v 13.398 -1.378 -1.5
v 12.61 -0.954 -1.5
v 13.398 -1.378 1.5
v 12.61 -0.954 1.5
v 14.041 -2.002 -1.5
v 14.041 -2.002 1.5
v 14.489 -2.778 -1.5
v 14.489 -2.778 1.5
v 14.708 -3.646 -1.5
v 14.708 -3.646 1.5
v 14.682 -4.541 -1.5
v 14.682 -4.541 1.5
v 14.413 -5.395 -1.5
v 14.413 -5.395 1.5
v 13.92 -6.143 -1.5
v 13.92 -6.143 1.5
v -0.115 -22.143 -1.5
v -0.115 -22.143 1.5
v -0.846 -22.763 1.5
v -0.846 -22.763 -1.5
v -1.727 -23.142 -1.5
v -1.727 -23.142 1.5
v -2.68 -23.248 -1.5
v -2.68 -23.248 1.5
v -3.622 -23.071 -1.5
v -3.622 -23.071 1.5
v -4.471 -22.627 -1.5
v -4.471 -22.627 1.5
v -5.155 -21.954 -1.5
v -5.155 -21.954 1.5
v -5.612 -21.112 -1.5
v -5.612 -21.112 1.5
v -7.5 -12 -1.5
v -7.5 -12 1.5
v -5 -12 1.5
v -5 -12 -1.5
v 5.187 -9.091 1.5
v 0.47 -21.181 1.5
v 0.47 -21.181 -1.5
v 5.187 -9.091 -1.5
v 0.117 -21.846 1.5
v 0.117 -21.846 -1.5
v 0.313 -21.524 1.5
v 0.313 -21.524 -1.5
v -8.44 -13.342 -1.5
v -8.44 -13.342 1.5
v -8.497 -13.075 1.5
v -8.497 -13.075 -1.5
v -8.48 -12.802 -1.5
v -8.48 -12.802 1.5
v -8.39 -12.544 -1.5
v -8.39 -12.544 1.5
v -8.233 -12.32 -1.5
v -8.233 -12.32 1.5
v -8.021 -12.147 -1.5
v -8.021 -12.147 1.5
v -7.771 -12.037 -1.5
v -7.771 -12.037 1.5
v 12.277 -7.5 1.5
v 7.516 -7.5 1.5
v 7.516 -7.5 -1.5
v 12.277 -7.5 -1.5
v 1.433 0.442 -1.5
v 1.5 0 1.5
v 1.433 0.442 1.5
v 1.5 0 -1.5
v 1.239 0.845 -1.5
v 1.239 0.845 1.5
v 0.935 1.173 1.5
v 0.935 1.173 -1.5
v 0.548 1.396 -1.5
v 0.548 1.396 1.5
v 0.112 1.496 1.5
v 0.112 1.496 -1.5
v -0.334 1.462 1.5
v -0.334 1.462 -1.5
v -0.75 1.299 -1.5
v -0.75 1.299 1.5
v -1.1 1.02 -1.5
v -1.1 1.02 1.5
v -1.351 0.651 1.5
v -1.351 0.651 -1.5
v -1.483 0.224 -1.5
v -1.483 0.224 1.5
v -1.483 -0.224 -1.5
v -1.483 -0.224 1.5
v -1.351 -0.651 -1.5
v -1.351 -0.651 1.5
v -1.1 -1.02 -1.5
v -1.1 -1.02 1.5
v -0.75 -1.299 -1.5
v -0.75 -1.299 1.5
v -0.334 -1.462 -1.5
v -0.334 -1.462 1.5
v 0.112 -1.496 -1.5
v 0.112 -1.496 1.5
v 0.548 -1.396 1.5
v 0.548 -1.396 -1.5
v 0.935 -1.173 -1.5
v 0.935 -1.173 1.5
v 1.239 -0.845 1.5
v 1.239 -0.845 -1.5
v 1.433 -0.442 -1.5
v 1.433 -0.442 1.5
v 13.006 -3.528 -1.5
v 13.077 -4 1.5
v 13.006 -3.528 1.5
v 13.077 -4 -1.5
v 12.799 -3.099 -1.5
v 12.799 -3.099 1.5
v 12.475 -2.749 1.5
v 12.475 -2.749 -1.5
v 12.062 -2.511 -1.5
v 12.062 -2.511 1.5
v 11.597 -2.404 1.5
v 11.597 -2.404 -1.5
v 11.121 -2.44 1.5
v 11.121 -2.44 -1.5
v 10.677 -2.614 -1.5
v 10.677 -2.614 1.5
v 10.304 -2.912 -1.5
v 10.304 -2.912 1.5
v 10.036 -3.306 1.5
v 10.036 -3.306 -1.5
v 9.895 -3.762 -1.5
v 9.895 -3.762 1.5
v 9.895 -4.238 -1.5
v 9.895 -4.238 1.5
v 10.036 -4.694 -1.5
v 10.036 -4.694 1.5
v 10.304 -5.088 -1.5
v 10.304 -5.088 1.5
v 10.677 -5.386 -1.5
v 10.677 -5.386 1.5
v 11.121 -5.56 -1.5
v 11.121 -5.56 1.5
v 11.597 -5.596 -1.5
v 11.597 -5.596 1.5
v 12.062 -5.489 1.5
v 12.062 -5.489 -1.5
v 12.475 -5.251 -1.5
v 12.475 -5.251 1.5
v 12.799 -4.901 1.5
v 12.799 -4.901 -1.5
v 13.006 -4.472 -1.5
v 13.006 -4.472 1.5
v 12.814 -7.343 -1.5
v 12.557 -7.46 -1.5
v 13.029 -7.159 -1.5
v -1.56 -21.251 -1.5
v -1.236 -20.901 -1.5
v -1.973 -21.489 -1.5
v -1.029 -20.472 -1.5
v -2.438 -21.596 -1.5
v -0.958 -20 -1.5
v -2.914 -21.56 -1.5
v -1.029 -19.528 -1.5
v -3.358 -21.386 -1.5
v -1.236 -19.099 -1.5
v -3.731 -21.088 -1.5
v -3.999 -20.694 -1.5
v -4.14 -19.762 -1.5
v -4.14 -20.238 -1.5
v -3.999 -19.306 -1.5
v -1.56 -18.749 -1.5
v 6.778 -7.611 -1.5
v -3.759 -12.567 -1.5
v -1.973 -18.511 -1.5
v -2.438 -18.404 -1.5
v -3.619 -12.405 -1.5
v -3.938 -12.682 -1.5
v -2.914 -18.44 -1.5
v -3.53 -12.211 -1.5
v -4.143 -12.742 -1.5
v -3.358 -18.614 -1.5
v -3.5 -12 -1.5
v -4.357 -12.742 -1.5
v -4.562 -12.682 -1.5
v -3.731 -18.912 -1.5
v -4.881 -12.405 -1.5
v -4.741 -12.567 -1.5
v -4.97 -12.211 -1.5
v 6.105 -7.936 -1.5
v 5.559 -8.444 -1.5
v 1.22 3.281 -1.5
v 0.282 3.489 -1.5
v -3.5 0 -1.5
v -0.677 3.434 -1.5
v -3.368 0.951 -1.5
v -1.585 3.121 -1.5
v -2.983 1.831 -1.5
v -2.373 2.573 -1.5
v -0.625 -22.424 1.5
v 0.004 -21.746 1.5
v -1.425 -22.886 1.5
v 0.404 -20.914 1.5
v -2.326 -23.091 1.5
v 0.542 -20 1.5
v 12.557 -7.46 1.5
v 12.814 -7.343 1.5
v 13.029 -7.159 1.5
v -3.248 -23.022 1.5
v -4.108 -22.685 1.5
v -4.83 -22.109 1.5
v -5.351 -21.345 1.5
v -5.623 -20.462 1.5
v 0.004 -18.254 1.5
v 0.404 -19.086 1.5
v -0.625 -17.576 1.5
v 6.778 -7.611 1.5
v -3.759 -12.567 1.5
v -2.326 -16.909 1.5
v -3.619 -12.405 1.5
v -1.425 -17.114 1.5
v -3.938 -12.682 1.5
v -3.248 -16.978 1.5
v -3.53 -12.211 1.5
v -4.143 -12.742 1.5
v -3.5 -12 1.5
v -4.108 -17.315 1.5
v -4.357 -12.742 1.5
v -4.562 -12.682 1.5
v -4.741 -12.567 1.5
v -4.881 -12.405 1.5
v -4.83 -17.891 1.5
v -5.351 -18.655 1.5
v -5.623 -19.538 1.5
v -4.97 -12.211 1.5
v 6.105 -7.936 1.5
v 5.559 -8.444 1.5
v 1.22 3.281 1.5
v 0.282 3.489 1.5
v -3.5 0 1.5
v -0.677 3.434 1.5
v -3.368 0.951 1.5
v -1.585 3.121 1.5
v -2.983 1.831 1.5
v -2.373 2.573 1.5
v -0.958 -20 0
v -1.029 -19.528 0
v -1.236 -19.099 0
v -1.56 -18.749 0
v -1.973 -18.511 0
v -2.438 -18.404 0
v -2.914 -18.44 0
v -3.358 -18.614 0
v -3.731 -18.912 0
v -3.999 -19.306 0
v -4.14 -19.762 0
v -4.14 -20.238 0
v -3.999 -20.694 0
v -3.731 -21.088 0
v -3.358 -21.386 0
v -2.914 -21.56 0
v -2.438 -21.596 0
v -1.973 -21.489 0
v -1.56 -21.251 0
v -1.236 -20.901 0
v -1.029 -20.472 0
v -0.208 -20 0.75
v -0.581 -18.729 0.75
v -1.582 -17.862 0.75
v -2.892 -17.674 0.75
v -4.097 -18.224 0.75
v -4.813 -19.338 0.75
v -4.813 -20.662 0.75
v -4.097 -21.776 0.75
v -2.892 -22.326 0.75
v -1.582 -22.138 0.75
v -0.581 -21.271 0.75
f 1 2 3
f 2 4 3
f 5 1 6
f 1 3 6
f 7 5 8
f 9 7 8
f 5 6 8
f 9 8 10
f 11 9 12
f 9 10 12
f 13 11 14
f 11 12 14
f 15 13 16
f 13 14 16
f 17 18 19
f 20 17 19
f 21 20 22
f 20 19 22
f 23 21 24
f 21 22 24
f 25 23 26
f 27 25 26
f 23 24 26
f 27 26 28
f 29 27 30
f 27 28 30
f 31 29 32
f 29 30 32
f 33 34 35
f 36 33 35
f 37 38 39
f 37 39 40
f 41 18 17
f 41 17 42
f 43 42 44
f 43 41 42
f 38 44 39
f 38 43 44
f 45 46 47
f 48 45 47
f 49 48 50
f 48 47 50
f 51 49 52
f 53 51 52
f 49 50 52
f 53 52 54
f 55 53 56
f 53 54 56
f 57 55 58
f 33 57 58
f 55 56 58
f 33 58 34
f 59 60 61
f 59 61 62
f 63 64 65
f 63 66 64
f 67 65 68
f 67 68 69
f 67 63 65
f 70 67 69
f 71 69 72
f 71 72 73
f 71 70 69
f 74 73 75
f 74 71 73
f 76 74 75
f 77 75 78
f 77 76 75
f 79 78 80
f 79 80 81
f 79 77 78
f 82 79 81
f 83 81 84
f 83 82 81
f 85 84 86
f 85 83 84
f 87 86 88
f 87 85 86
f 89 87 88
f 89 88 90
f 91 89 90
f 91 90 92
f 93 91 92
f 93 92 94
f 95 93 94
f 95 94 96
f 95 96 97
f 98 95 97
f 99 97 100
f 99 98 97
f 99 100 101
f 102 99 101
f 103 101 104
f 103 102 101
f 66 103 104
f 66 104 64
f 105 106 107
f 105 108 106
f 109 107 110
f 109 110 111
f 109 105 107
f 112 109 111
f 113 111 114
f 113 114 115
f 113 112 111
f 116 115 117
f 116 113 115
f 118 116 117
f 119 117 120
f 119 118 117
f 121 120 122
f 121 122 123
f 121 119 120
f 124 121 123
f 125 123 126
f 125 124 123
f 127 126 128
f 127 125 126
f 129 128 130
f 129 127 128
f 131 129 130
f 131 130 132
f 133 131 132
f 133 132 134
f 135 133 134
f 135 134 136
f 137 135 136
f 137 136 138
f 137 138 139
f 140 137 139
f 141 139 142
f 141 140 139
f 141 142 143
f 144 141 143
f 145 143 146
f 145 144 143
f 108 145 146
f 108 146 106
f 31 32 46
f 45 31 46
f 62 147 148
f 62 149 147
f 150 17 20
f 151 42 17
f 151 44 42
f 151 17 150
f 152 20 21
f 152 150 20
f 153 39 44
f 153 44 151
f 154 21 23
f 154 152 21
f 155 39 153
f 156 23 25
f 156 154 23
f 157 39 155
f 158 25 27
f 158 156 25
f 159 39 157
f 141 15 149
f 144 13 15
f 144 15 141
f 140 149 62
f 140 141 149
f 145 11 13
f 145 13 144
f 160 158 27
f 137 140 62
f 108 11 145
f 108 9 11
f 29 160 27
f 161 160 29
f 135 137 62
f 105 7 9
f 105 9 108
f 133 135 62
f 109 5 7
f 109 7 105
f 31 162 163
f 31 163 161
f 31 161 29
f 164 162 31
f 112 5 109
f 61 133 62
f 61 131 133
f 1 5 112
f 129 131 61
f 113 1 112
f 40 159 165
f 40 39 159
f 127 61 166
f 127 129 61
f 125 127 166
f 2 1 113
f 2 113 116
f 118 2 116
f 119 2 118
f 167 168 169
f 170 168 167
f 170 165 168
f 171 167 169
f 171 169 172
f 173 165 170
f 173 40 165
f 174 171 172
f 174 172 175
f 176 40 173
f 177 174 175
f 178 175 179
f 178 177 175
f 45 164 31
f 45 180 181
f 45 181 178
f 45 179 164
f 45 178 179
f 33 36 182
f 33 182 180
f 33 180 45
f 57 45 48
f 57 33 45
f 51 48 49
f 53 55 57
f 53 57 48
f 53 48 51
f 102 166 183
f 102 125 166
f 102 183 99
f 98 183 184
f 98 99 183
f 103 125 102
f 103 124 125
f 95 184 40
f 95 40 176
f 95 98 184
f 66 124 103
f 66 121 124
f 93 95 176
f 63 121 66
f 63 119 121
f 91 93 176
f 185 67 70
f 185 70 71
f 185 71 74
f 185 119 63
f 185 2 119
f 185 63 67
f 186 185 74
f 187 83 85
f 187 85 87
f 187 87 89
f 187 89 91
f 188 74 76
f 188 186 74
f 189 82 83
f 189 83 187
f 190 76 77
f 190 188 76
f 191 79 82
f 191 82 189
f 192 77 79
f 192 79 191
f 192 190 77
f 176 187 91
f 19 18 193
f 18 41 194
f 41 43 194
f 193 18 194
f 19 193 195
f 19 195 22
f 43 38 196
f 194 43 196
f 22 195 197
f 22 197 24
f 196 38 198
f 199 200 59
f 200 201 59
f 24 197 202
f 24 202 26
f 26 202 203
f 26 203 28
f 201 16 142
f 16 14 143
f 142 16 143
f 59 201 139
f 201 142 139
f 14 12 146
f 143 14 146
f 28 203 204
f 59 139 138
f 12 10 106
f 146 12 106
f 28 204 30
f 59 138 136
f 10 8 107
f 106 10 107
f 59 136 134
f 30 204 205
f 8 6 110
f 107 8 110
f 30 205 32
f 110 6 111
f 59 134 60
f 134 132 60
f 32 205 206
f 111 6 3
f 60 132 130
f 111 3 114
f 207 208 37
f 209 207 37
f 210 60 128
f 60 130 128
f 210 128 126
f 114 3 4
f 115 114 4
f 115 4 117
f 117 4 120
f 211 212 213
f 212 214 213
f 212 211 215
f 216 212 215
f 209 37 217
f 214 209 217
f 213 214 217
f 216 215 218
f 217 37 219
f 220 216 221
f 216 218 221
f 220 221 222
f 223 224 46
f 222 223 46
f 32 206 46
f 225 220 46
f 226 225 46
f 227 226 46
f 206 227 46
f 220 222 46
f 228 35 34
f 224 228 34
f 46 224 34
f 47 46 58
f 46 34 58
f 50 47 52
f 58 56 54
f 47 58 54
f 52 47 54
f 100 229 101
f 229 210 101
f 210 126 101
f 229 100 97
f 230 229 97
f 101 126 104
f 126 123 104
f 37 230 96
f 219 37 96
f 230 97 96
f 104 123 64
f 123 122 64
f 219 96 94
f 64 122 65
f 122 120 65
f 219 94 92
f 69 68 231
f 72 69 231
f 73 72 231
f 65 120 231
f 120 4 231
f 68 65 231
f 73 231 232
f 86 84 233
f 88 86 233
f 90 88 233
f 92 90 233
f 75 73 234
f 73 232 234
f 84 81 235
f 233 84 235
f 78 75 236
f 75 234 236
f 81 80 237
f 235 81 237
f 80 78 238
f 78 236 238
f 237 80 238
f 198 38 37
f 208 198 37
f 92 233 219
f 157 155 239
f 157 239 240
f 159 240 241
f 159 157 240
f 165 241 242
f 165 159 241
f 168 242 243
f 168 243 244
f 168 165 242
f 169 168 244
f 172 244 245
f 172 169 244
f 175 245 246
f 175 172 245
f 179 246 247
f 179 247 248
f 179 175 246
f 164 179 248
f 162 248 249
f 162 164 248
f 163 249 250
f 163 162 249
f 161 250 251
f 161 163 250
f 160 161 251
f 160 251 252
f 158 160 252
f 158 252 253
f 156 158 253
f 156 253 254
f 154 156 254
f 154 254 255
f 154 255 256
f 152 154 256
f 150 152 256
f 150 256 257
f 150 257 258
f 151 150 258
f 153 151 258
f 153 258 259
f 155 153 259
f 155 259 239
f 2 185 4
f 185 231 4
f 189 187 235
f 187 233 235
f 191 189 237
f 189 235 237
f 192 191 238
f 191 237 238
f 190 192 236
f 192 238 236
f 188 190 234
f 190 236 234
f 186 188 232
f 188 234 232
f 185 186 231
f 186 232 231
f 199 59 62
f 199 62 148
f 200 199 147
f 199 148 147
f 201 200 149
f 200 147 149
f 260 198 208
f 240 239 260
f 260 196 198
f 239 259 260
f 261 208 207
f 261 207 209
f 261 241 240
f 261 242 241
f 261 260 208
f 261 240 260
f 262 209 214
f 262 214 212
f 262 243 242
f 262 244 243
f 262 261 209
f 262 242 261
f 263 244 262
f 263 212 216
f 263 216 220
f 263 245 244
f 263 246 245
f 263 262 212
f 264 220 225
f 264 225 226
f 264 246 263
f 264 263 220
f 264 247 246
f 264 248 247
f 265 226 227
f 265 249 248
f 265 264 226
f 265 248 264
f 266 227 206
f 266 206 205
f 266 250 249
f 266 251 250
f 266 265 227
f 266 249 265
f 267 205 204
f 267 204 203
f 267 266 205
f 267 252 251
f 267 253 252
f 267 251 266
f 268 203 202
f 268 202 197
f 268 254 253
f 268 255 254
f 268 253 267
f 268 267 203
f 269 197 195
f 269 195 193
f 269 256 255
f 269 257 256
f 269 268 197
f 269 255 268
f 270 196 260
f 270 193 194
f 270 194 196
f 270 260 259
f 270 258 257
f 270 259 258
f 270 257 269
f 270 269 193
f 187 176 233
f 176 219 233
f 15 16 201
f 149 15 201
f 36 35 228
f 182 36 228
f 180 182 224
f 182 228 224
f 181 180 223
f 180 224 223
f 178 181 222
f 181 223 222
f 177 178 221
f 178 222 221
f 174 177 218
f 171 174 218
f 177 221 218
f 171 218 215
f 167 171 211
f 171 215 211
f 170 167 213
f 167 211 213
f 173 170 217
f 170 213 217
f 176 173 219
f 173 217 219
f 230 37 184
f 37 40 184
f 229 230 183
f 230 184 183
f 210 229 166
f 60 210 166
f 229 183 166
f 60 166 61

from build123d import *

# Parameters (mm, degrees)
SKETCH_1_R          = 1.5
SKETCH_1_R_2        = 1.6
EXTRUDE_1_DEPTH     = 1.5
CHAMFER_1_SIZE      = 1.5
SKETCH_2_R          = 0.75
CUT_EXTRUDE_1_DEPTH = 28.684874976
CUT_EXTRUDE_2_DEPTH = 28.684874976
FILLET_1_R          = 2.5
FILLET_2_R          = 1


with BuildPart() as part:
    # 草图1 → 凸台-拉伸1 (new, symmetric)
    with BuildSketch(Plane.XY):
        with BuildLine():
            Line((-7.5, -12), (-3.5, -12))
            Line((-3.5, -12), (-3.5, 0))
            ThreePointArc((-3.5, 0), (-1.997674375, 2.873899283), (1.219598337, 3.280637117))
            Line((1.219598337, 3.280637117), (12.609663209, -0.953694105))
            ThreePointArc((12.609663209, -0.953694105), (14.628222296, -3.204119106), (13.92040375, -6.143164253))
            Line((13.92040375, -6.143164253), (-0.114583662, -22.143164253))
            ThreePointArc((-0.114583662, -22.143164253), (-3.157233879, -23.194243112), (-5.61180939, -21.111565466))
            Line((-5.61180939, -21.111565466), (-8.439692621, -13.342020143))
            ThreePointArc((-8.439692621, -13.342020143), (-8.319152044, -12.426423564), (-7.5, -12))
        make_face()
        Circle(SKETCH_1_R, mode=Mode.SUBTRACT)
        with Locations((-2.557808372, -20)):
            Circle(SKETCH_1_R_2, mode=Mode.SUBTRACT)
        with Locations((11.477179039, -4)):
            Circle(SKETCH_1_R_2, mode=Mode.SUBTRACT)
    extrude(amount=EXTRUDE_1_DEPTH, both=True)

    # 倒角1
    chamfer_1_edges = [part.edges().sort_by_distance(p)[0] for p in [
        (-4.157808372, -20, 1.5),
    ]]
    chamfer(chamfer_1_edges, length=CHAMFER_1_SIZE)

    # 草图2 → 切除-拉伸1 (cut, through all)
    with BuildSketch(Plane.XY.offset(1.5)):
        with Locations((-4.25, -12)):
            Circle(SKETCH_2_R)
    extrude(amount=-CUT_EXTRUDE_1_DEPTH, mode=Mode.SUBTRACT)

    # 草图3 → 切除-拉伸2 (cut, through all)
    with BuildSketch(Plane.XY.offset(1.5)):
        with BuildLine():
            Line((5.807426852, -7.5), (12.73020546, -7.5))
            Line((12.73020546, -7.5), (-0.114583662, -22.143164253))
            ThreePointArc((-0.114583662, -22.143164253), (0.219636548, -21.687690646), (0.469932731, -21.181221322))
            Line((0.469932731, -21.181221322), (5.807426852, -7.5))
        make_face()
    extrude(amount=-CUT_EXTRUDE_2_DEPTH, mode=Mode.SUBTRACT)

    # 圆角1
    fillet_1_edges = [part.edges().sort_by_distance(p)[0] for p in [
        (5.807426852, -7.5, 0),
    ]]
    fillet(fillet_1_edges, radius=FILLET_1_R)

    # 圆角2
    fillet_2_edges = [part.edges().sort_by_distance(p)[0] for p in [
        (12.73020546, -7.5, 0),
    ]]
    fillet(fillet_2_edges, radius=FILLET_2_R)


solid = part.part
